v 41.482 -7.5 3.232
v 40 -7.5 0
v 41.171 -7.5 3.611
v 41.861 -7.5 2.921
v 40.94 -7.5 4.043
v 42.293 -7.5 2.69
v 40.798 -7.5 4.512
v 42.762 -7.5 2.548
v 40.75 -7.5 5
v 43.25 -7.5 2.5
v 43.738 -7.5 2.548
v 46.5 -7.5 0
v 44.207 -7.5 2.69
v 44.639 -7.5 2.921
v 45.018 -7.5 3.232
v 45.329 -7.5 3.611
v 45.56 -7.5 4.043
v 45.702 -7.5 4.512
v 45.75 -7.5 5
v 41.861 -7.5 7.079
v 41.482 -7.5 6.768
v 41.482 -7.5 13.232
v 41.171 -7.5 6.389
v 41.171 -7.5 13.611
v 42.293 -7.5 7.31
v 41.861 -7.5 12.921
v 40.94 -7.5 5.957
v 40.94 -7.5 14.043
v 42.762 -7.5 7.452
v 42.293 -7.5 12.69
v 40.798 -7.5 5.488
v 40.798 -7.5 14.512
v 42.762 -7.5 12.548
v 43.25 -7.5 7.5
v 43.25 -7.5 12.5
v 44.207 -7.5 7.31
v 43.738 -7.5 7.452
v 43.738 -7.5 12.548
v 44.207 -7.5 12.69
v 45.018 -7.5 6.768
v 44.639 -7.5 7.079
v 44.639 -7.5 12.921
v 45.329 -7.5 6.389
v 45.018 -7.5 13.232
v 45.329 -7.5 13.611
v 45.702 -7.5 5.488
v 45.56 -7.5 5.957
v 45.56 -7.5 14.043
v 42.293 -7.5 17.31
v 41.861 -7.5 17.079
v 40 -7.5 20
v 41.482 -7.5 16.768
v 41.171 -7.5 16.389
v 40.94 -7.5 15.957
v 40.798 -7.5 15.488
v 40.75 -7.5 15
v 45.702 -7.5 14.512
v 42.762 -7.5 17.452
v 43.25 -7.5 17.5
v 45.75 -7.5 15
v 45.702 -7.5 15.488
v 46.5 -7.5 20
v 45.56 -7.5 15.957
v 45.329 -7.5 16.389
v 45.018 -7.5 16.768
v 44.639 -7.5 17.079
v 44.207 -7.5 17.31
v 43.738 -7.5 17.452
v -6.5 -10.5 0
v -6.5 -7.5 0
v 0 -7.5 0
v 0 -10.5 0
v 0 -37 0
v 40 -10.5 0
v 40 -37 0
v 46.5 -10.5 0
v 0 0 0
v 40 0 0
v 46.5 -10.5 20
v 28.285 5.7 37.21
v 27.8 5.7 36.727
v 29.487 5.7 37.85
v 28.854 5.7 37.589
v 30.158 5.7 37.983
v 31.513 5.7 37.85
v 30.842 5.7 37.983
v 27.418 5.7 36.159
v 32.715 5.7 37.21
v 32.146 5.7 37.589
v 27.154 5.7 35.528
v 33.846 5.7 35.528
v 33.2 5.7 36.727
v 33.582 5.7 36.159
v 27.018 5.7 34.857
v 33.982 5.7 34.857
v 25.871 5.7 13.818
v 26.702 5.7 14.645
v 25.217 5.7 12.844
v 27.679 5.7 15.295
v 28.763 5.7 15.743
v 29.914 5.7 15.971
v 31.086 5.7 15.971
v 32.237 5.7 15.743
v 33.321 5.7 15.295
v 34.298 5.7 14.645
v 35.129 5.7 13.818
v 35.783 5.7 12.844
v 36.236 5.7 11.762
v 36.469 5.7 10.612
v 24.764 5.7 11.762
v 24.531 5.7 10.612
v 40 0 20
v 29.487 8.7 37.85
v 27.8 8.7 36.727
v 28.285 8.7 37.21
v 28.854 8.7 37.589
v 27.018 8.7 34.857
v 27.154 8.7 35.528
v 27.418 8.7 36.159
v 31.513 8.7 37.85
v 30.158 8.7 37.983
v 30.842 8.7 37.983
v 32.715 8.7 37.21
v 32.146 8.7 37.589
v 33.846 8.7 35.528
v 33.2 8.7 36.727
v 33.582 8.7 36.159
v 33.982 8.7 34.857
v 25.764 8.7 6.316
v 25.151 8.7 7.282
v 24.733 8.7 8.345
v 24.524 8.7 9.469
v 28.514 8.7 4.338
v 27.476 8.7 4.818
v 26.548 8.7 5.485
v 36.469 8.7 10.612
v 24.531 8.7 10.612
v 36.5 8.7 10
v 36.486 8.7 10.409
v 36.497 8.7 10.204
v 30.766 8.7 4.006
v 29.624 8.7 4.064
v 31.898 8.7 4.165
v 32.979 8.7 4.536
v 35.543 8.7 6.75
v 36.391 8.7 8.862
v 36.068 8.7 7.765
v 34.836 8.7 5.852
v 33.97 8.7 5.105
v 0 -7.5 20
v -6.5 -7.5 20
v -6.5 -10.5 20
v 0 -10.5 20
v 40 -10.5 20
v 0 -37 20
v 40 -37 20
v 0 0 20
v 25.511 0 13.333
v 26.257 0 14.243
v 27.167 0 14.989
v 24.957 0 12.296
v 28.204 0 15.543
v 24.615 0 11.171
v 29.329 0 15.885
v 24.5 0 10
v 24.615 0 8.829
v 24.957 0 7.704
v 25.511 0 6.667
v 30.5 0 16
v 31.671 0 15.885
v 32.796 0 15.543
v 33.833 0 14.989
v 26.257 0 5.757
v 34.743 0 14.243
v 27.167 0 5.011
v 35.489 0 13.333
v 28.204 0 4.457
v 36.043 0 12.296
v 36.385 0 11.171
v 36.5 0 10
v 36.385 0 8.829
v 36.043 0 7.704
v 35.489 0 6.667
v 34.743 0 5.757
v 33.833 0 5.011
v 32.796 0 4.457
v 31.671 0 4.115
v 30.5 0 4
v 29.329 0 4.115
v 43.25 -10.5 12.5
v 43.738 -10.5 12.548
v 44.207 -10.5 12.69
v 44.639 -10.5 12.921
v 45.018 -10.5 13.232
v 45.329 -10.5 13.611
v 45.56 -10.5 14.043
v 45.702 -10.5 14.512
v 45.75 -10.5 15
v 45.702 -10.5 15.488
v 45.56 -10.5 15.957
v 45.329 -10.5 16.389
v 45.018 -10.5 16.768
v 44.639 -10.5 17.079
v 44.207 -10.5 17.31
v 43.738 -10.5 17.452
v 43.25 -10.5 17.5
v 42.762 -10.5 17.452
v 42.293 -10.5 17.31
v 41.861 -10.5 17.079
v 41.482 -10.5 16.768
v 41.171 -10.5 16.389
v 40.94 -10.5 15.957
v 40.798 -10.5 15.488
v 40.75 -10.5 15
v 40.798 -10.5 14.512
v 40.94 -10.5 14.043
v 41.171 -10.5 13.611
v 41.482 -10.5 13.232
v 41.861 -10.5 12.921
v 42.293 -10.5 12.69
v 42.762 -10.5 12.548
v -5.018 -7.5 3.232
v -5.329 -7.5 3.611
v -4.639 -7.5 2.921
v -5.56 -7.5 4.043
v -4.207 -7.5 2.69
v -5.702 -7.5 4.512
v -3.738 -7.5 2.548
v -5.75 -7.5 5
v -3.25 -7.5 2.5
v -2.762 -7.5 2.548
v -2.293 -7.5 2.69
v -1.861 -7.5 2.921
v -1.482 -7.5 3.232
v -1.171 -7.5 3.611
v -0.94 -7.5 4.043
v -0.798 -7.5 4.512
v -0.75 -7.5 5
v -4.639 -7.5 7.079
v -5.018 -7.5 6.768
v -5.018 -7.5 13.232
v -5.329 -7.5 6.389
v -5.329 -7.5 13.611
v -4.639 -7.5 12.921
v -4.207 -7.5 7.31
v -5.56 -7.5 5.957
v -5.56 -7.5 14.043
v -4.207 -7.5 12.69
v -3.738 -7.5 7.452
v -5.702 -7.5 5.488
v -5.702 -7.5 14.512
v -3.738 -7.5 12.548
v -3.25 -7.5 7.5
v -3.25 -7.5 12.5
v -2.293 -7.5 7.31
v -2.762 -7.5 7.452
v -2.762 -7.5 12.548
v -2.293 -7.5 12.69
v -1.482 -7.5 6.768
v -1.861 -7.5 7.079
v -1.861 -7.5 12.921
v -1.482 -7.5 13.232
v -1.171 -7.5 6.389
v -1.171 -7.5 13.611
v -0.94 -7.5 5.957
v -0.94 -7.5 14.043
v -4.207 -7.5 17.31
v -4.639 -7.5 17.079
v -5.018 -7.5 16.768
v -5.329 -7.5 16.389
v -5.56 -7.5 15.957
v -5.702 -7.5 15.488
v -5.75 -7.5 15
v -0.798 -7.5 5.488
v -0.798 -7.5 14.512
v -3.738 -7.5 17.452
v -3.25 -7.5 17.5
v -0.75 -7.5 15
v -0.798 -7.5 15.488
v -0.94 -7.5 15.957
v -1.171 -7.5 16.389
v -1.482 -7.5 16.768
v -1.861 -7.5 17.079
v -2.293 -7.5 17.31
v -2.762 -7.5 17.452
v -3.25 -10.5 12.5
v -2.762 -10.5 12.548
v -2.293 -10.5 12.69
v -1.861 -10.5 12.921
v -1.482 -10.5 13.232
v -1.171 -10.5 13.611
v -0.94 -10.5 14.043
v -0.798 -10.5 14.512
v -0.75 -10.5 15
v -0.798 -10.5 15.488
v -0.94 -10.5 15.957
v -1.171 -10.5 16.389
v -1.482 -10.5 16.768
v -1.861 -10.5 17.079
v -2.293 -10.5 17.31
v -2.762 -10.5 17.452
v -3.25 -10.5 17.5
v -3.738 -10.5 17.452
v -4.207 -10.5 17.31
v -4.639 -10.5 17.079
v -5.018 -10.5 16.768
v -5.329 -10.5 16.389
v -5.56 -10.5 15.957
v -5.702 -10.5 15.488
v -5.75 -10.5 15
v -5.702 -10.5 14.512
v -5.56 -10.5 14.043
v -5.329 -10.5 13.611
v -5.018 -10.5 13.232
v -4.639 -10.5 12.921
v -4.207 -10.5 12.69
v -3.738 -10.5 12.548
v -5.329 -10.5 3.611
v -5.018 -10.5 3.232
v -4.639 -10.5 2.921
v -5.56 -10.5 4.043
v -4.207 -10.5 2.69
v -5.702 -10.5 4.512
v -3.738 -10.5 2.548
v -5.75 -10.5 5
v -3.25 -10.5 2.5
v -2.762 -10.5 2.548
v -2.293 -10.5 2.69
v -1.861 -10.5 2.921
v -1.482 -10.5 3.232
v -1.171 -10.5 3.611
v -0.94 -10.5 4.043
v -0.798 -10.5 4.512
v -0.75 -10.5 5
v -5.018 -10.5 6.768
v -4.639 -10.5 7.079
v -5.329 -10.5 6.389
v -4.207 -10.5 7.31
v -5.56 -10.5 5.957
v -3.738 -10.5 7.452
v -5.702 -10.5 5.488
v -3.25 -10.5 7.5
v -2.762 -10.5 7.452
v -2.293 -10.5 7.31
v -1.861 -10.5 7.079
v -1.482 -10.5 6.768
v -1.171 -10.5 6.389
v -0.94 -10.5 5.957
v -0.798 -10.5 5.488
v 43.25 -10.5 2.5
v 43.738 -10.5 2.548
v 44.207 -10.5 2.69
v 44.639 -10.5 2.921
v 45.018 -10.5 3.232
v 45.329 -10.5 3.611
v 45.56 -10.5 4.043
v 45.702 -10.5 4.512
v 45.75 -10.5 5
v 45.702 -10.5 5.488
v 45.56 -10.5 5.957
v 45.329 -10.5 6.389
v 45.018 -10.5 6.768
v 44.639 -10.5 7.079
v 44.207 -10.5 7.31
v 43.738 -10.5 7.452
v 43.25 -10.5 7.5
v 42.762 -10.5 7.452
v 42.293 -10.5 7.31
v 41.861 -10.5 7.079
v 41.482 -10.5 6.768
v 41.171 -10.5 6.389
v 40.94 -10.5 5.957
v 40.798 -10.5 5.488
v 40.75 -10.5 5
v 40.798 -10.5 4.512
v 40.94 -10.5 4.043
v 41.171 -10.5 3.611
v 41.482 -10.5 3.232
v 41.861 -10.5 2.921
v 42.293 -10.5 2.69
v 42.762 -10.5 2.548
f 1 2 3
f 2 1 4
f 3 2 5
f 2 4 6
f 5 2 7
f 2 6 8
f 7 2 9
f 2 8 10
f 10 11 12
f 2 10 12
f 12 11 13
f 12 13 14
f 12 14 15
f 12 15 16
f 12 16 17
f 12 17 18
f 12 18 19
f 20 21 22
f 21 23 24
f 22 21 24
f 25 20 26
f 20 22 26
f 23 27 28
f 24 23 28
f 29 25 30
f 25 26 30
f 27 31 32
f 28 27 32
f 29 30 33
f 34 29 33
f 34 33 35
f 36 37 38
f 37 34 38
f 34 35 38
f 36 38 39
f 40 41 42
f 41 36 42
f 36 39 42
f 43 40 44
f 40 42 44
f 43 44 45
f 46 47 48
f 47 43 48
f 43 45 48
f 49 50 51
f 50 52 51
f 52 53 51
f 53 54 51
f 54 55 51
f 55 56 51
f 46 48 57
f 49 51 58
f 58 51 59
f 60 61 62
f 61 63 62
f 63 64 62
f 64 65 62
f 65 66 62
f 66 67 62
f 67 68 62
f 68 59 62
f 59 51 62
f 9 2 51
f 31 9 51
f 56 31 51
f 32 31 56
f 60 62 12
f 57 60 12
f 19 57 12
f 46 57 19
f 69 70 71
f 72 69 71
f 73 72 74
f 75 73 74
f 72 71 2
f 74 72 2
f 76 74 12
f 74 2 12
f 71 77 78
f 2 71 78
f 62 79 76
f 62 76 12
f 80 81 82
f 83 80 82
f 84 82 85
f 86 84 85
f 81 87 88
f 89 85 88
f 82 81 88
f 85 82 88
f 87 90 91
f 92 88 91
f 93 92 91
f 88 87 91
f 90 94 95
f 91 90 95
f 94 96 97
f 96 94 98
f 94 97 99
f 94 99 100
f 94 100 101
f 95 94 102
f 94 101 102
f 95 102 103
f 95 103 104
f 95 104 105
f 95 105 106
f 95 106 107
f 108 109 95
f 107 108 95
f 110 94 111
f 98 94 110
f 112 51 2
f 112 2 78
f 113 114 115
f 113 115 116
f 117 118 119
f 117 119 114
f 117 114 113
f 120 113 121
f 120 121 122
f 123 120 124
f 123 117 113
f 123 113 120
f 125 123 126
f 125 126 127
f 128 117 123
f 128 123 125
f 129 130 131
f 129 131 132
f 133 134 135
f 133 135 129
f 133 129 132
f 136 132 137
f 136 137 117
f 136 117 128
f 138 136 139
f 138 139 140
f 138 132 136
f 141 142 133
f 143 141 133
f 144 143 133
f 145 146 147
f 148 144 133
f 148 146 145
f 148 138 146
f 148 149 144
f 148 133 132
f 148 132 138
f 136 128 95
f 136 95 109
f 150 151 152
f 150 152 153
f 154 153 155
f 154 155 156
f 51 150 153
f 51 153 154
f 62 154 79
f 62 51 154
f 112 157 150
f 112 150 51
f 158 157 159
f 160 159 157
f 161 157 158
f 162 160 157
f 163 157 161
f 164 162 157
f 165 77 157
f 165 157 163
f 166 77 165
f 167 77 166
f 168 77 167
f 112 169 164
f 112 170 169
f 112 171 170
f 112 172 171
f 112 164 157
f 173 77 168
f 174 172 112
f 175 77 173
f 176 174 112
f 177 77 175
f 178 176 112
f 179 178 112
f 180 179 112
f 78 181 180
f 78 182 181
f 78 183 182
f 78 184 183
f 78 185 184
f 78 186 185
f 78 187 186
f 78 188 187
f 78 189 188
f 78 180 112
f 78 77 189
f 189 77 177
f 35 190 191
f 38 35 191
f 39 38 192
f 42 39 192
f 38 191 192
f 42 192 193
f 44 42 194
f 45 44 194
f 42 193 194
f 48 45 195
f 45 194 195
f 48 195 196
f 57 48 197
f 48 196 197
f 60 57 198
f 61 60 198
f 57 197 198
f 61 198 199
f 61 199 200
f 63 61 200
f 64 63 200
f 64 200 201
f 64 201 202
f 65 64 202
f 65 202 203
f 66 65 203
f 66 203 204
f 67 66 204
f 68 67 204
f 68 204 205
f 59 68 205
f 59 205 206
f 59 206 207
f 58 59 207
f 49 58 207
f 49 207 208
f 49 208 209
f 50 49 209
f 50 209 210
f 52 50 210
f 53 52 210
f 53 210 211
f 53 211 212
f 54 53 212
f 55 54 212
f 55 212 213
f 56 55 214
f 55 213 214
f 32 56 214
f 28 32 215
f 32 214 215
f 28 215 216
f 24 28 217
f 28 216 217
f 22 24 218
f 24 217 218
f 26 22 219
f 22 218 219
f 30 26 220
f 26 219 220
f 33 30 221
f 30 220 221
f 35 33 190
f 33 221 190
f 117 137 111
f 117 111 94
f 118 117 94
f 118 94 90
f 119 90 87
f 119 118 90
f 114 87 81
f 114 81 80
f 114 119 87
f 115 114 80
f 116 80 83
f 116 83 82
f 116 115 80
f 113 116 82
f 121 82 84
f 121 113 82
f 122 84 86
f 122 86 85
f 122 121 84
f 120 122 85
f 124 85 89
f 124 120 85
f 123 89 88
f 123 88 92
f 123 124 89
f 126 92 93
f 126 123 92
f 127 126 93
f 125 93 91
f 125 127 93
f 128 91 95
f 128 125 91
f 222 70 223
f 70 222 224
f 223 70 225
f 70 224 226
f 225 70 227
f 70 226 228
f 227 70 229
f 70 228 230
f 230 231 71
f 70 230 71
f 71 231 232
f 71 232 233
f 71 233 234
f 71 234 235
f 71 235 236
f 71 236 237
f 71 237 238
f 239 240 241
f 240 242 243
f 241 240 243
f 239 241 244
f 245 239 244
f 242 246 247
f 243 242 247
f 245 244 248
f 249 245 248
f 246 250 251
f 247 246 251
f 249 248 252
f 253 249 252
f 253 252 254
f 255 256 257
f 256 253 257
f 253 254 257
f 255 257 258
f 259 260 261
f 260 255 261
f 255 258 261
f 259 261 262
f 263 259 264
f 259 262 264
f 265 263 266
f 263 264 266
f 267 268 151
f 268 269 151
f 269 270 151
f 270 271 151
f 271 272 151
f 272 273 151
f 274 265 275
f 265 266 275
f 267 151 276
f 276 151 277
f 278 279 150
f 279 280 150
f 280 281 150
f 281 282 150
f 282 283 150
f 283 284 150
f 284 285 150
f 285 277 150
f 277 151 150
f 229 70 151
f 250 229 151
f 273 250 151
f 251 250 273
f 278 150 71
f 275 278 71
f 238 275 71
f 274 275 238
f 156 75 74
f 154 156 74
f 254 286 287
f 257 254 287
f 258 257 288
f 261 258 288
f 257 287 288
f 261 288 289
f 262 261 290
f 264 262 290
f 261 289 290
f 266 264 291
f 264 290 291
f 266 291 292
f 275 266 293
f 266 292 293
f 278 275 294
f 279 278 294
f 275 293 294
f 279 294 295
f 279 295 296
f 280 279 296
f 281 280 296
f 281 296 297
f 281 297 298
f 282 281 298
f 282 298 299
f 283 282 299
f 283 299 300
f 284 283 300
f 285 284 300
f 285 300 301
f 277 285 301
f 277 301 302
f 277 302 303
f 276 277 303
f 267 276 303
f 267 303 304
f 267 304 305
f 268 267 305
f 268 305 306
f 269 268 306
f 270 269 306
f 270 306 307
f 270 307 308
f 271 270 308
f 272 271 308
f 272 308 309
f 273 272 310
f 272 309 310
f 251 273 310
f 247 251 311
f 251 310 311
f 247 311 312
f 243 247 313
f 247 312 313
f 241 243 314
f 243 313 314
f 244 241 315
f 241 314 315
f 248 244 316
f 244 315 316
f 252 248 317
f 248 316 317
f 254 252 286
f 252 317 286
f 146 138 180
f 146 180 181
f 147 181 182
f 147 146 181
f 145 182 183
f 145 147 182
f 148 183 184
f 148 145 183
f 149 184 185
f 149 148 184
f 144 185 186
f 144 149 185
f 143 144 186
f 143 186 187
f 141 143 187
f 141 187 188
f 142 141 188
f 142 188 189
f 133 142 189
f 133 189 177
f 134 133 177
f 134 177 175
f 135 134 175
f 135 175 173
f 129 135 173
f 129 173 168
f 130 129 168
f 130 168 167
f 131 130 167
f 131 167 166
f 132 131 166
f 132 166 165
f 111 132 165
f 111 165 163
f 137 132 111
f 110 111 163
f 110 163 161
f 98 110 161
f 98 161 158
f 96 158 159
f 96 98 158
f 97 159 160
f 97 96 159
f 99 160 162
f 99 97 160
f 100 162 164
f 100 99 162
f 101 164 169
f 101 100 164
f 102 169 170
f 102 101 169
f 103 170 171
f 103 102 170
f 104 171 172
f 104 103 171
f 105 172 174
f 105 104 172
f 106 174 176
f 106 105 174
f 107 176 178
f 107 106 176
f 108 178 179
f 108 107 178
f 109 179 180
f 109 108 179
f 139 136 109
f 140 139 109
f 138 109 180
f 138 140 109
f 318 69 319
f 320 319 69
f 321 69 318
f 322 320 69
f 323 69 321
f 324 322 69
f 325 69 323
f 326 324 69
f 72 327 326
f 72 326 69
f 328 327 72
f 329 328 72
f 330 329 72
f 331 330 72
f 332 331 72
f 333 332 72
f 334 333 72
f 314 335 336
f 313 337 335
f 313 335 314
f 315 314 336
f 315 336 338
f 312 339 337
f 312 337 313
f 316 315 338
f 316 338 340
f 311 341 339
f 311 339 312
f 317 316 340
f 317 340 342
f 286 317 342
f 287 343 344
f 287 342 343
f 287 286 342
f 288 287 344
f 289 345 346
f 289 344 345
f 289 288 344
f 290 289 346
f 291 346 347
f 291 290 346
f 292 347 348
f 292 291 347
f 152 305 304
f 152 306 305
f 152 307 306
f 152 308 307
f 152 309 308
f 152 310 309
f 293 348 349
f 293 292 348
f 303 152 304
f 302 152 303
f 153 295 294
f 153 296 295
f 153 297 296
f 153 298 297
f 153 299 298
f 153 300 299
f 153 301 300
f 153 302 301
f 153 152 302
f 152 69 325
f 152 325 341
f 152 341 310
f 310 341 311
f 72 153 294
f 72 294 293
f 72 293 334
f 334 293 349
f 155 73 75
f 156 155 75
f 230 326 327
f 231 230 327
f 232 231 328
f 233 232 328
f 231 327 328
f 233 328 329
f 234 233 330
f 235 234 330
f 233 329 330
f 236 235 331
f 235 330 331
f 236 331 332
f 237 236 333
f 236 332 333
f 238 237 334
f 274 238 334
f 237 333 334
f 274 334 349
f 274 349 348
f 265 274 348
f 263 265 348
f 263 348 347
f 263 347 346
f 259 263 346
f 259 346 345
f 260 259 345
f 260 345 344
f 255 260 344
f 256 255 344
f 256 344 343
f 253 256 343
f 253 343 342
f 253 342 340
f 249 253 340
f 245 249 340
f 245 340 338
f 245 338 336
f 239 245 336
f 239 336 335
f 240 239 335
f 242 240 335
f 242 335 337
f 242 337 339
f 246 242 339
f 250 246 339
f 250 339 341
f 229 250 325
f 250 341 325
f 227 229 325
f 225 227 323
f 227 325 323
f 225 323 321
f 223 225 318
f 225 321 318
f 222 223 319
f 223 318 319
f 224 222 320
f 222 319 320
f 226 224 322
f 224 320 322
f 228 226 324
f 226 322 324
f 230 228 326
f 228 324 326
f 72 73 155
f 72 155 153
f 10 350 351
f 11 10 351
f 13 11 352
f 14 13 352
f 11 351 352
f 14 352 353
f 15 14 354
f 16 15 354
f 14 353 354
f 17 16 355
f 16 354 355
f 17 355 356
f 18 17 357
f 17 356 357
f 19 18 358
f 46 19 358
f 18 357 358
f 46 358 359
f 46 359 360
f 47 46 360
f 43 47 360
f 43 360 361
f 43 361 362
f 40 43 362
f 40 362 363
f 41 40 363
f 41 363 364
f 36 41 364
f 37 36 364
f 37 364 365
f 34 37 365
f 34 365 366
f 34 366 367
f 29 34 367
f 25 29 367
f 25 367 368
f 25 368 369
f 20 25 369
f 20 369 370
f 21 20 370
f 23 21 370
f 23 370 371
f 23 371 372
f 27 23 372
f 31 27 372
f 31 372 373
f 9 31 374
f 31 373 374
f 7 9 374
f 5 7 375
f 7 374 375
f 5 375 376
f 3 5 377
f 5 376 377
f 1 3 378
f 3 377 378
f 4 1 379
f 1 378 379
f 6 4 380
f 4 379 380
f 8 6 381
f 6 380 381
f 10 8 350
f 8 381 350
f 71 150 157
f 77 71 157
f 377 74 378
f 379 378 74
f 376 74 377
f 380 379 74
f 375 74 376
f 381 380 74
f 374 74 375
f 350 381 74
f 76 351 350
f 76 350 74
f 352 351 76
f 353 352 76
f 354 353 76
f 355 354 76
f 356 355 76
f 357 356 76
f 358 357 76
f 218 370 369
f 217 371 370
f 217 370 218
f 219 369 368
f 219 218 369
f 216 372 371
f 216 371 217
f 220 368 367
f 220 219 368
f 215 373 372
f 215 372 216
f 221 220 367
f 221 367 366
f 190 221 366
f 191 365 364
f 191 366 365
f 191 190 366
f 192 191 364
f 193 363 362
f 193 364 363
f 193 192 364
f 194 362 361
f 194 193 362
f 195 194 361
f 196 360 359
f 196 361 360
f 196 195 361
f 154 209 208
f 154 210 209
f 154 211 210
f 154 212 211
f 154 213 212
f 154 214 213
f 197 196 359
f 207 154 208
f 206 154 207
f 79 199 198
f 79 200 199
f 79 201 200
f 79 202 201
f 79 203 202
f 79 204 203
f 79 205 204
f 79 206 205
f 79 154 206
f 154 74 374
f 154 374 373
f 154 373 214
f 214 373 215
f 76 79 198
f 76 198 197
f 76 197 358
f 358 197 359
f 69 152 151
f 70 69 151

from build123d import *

# Parameters (mm, degrees)
SKETCH1_W           = 40
SKETCH1_H           = 37
BOSS_EXTRUDE1_DEPTH = 20
SKETCH2_W           = 6.5
SKETCH2_H           = 3
BOSS_EXTRUDE2_DEPTH = 20
BOSS_EXTRUDE3_DEPTH = 8.7
BOSS_EXTRUDE4_DEPTH = 3
CUT_EXTRUDE2_REACH  = 67.639
SKETCH5_R           = 2.5


with BuildPart() as part:
    # Sketch1 → Boss-Extrude1 (new body)
    with BuildSketch(Plane.XY):
        with Locations((20, -18.5)):
            Rectangle(SKETCH1_W, SKETCH1_H)
    extrude(amount=BOSS_EXTRUDE1_DEPTH)

    # Sketch2 → Boss-Extrude2 (add)
    with BuildSketch(Plane.XY.offset(20)):
        with Locations((-3.25, -9)):
            Rectangle(SKETCH2_W, SKETCH2_H)
        with Locations((43.25, -9)):
            Rectangle(SKETCH2_W, SKETCH2_H)
    extrude(amount=-BOSS_EXTRUDE2_DEPTH)

    # Sketch3 → Boss-Extrude3 (add)
    with BuildSketch(Plane(origin=(0, 8.7, 0), x_dir=(1, 0, 0), z_dir=(0, 1, 0))):
        with BuildLine():
            ThreePointArc((24.5, -10), (30.5, -16), (36.5, -10))
            Line((36.5, -10), (24.5, -10))
        make_face()
        with BuildLine():
            Line((24.5, -10), (36.5, -10))
            ThreePointArc((36.5, -10), (30.5, -4), (24.5, -10))
        make_face()
    extrude(amount=-BOSS_EXTRUDE3_DEPTH)

    # Sketch4 → Boss-Extrude4 (add)
    with BuildSketch(Plane(origin=(0, 8.7, 0), x_dir=(1, 0, 0), z_dir=(0, 1, 0))):
        with BuildLine():
            Line((33.981730745, -34.857142857), (36.468681277, -10.612244898))
            ThreePointArc((36.468681277, -10.612244898), (30.5, -4), (24.531318723, -10.612244898))
            Line((24.531318723, -10.612244898), (27.018269255, -34.857142857))
            ThreePointArc((27.018269255, -34.857142857), (30.5, -38), (33.981730745, -34.857142857))
        make_face()
    extrude(amount=-BOSS_EXTRUDE4_DEPTH)

    # Sketch5 → Cut-Extrude2 (cut, up to next)
    with BuildSketch(Plane.XZ.offset(10.5), mode=Mode.PRIVATE) as cut_extrude2_sk1:
        with Locations(Location((43.25, 15, 0), (0, 0, 270))):
            Circle(SKETCH5_R)
    cut_extrude2_tool1 = extrude(cut_extrude2_sk1.sketch, amount=-CUT_EXTRUDE2_REACH, mode=Mode.PRIVATE) & part.part
    # Sketch5 → Cut-Extrude2 (cut, up to next)
    with BuildSketch(Plane.XZ.offset(10.5), mode=Mode.PRIVATE) as cut_extrude2_sk2:
        with Locations(Location((43.25, 5, 0), (0, 0, 270))):
            Circle(SKETCH5_R)
    cut_extrude2_tool2 = extrude(cut_extrude2_sk2.sketch, amount=-CUT_EXTRUDE2_REACH, mode=Mode.PRIVATE) & part.part
    # Sketch5 → Cut-Extrude2 (cut, up to next)
    with BuildSketch(Plane.XZ.offset(10.5), mode=Mode.PRIVATE) as cut_extrude2_sk3:
        with Locations(Location((-3.25, 15, 0), (0, 0, 270))):
            Circle(SKETCH5_R)
    cut_extrude2_tool3 = extrude(cut_extrude2_sk3.sketch, amount=-CUT_EXTRUDE2_REACH, mode=Mode.PRIVATE) & part.part
    # Sketch5 → Cut-Extrude2 (cut, up to next)
    with BuildSketch(Plane.XZ.offset(10.5), mode=Mode.PRIVATE) as cut_extrude2_sk4:
        with Locations(Location((-3.25, 5, 0), (0, 0, 270))):
            Circle(SKETCH5_R)
    cut_extrude2_tool4 = extrude(cut_extrude2_sk4.sketch, amount=-CUT_EXTRUDE2_REACH, mode=Mode.PRIVATE) & part.part
    add(cut_extrude2_tool1.solids().sort_by_distance((43.25, -10.5, 15))[0], mode=Mode.SUBTRACT)
    add(cut_extrude2_tool2.solids().sort_by_distance((43.25, -10.5, 5))[0], mode=Mode.SUBTRACT)
    add(cut_extrude2_tool3.solids().sort_by_distance((-3.25, -10.5, 15))[0], mode=Mode.SUBTRACT)
    add(cut_extrude2_tool4.solids().sort_by_distance((-3.25, -10.5, 5))[0], mode=Mode.SUBTRACT)


solid = part.part
